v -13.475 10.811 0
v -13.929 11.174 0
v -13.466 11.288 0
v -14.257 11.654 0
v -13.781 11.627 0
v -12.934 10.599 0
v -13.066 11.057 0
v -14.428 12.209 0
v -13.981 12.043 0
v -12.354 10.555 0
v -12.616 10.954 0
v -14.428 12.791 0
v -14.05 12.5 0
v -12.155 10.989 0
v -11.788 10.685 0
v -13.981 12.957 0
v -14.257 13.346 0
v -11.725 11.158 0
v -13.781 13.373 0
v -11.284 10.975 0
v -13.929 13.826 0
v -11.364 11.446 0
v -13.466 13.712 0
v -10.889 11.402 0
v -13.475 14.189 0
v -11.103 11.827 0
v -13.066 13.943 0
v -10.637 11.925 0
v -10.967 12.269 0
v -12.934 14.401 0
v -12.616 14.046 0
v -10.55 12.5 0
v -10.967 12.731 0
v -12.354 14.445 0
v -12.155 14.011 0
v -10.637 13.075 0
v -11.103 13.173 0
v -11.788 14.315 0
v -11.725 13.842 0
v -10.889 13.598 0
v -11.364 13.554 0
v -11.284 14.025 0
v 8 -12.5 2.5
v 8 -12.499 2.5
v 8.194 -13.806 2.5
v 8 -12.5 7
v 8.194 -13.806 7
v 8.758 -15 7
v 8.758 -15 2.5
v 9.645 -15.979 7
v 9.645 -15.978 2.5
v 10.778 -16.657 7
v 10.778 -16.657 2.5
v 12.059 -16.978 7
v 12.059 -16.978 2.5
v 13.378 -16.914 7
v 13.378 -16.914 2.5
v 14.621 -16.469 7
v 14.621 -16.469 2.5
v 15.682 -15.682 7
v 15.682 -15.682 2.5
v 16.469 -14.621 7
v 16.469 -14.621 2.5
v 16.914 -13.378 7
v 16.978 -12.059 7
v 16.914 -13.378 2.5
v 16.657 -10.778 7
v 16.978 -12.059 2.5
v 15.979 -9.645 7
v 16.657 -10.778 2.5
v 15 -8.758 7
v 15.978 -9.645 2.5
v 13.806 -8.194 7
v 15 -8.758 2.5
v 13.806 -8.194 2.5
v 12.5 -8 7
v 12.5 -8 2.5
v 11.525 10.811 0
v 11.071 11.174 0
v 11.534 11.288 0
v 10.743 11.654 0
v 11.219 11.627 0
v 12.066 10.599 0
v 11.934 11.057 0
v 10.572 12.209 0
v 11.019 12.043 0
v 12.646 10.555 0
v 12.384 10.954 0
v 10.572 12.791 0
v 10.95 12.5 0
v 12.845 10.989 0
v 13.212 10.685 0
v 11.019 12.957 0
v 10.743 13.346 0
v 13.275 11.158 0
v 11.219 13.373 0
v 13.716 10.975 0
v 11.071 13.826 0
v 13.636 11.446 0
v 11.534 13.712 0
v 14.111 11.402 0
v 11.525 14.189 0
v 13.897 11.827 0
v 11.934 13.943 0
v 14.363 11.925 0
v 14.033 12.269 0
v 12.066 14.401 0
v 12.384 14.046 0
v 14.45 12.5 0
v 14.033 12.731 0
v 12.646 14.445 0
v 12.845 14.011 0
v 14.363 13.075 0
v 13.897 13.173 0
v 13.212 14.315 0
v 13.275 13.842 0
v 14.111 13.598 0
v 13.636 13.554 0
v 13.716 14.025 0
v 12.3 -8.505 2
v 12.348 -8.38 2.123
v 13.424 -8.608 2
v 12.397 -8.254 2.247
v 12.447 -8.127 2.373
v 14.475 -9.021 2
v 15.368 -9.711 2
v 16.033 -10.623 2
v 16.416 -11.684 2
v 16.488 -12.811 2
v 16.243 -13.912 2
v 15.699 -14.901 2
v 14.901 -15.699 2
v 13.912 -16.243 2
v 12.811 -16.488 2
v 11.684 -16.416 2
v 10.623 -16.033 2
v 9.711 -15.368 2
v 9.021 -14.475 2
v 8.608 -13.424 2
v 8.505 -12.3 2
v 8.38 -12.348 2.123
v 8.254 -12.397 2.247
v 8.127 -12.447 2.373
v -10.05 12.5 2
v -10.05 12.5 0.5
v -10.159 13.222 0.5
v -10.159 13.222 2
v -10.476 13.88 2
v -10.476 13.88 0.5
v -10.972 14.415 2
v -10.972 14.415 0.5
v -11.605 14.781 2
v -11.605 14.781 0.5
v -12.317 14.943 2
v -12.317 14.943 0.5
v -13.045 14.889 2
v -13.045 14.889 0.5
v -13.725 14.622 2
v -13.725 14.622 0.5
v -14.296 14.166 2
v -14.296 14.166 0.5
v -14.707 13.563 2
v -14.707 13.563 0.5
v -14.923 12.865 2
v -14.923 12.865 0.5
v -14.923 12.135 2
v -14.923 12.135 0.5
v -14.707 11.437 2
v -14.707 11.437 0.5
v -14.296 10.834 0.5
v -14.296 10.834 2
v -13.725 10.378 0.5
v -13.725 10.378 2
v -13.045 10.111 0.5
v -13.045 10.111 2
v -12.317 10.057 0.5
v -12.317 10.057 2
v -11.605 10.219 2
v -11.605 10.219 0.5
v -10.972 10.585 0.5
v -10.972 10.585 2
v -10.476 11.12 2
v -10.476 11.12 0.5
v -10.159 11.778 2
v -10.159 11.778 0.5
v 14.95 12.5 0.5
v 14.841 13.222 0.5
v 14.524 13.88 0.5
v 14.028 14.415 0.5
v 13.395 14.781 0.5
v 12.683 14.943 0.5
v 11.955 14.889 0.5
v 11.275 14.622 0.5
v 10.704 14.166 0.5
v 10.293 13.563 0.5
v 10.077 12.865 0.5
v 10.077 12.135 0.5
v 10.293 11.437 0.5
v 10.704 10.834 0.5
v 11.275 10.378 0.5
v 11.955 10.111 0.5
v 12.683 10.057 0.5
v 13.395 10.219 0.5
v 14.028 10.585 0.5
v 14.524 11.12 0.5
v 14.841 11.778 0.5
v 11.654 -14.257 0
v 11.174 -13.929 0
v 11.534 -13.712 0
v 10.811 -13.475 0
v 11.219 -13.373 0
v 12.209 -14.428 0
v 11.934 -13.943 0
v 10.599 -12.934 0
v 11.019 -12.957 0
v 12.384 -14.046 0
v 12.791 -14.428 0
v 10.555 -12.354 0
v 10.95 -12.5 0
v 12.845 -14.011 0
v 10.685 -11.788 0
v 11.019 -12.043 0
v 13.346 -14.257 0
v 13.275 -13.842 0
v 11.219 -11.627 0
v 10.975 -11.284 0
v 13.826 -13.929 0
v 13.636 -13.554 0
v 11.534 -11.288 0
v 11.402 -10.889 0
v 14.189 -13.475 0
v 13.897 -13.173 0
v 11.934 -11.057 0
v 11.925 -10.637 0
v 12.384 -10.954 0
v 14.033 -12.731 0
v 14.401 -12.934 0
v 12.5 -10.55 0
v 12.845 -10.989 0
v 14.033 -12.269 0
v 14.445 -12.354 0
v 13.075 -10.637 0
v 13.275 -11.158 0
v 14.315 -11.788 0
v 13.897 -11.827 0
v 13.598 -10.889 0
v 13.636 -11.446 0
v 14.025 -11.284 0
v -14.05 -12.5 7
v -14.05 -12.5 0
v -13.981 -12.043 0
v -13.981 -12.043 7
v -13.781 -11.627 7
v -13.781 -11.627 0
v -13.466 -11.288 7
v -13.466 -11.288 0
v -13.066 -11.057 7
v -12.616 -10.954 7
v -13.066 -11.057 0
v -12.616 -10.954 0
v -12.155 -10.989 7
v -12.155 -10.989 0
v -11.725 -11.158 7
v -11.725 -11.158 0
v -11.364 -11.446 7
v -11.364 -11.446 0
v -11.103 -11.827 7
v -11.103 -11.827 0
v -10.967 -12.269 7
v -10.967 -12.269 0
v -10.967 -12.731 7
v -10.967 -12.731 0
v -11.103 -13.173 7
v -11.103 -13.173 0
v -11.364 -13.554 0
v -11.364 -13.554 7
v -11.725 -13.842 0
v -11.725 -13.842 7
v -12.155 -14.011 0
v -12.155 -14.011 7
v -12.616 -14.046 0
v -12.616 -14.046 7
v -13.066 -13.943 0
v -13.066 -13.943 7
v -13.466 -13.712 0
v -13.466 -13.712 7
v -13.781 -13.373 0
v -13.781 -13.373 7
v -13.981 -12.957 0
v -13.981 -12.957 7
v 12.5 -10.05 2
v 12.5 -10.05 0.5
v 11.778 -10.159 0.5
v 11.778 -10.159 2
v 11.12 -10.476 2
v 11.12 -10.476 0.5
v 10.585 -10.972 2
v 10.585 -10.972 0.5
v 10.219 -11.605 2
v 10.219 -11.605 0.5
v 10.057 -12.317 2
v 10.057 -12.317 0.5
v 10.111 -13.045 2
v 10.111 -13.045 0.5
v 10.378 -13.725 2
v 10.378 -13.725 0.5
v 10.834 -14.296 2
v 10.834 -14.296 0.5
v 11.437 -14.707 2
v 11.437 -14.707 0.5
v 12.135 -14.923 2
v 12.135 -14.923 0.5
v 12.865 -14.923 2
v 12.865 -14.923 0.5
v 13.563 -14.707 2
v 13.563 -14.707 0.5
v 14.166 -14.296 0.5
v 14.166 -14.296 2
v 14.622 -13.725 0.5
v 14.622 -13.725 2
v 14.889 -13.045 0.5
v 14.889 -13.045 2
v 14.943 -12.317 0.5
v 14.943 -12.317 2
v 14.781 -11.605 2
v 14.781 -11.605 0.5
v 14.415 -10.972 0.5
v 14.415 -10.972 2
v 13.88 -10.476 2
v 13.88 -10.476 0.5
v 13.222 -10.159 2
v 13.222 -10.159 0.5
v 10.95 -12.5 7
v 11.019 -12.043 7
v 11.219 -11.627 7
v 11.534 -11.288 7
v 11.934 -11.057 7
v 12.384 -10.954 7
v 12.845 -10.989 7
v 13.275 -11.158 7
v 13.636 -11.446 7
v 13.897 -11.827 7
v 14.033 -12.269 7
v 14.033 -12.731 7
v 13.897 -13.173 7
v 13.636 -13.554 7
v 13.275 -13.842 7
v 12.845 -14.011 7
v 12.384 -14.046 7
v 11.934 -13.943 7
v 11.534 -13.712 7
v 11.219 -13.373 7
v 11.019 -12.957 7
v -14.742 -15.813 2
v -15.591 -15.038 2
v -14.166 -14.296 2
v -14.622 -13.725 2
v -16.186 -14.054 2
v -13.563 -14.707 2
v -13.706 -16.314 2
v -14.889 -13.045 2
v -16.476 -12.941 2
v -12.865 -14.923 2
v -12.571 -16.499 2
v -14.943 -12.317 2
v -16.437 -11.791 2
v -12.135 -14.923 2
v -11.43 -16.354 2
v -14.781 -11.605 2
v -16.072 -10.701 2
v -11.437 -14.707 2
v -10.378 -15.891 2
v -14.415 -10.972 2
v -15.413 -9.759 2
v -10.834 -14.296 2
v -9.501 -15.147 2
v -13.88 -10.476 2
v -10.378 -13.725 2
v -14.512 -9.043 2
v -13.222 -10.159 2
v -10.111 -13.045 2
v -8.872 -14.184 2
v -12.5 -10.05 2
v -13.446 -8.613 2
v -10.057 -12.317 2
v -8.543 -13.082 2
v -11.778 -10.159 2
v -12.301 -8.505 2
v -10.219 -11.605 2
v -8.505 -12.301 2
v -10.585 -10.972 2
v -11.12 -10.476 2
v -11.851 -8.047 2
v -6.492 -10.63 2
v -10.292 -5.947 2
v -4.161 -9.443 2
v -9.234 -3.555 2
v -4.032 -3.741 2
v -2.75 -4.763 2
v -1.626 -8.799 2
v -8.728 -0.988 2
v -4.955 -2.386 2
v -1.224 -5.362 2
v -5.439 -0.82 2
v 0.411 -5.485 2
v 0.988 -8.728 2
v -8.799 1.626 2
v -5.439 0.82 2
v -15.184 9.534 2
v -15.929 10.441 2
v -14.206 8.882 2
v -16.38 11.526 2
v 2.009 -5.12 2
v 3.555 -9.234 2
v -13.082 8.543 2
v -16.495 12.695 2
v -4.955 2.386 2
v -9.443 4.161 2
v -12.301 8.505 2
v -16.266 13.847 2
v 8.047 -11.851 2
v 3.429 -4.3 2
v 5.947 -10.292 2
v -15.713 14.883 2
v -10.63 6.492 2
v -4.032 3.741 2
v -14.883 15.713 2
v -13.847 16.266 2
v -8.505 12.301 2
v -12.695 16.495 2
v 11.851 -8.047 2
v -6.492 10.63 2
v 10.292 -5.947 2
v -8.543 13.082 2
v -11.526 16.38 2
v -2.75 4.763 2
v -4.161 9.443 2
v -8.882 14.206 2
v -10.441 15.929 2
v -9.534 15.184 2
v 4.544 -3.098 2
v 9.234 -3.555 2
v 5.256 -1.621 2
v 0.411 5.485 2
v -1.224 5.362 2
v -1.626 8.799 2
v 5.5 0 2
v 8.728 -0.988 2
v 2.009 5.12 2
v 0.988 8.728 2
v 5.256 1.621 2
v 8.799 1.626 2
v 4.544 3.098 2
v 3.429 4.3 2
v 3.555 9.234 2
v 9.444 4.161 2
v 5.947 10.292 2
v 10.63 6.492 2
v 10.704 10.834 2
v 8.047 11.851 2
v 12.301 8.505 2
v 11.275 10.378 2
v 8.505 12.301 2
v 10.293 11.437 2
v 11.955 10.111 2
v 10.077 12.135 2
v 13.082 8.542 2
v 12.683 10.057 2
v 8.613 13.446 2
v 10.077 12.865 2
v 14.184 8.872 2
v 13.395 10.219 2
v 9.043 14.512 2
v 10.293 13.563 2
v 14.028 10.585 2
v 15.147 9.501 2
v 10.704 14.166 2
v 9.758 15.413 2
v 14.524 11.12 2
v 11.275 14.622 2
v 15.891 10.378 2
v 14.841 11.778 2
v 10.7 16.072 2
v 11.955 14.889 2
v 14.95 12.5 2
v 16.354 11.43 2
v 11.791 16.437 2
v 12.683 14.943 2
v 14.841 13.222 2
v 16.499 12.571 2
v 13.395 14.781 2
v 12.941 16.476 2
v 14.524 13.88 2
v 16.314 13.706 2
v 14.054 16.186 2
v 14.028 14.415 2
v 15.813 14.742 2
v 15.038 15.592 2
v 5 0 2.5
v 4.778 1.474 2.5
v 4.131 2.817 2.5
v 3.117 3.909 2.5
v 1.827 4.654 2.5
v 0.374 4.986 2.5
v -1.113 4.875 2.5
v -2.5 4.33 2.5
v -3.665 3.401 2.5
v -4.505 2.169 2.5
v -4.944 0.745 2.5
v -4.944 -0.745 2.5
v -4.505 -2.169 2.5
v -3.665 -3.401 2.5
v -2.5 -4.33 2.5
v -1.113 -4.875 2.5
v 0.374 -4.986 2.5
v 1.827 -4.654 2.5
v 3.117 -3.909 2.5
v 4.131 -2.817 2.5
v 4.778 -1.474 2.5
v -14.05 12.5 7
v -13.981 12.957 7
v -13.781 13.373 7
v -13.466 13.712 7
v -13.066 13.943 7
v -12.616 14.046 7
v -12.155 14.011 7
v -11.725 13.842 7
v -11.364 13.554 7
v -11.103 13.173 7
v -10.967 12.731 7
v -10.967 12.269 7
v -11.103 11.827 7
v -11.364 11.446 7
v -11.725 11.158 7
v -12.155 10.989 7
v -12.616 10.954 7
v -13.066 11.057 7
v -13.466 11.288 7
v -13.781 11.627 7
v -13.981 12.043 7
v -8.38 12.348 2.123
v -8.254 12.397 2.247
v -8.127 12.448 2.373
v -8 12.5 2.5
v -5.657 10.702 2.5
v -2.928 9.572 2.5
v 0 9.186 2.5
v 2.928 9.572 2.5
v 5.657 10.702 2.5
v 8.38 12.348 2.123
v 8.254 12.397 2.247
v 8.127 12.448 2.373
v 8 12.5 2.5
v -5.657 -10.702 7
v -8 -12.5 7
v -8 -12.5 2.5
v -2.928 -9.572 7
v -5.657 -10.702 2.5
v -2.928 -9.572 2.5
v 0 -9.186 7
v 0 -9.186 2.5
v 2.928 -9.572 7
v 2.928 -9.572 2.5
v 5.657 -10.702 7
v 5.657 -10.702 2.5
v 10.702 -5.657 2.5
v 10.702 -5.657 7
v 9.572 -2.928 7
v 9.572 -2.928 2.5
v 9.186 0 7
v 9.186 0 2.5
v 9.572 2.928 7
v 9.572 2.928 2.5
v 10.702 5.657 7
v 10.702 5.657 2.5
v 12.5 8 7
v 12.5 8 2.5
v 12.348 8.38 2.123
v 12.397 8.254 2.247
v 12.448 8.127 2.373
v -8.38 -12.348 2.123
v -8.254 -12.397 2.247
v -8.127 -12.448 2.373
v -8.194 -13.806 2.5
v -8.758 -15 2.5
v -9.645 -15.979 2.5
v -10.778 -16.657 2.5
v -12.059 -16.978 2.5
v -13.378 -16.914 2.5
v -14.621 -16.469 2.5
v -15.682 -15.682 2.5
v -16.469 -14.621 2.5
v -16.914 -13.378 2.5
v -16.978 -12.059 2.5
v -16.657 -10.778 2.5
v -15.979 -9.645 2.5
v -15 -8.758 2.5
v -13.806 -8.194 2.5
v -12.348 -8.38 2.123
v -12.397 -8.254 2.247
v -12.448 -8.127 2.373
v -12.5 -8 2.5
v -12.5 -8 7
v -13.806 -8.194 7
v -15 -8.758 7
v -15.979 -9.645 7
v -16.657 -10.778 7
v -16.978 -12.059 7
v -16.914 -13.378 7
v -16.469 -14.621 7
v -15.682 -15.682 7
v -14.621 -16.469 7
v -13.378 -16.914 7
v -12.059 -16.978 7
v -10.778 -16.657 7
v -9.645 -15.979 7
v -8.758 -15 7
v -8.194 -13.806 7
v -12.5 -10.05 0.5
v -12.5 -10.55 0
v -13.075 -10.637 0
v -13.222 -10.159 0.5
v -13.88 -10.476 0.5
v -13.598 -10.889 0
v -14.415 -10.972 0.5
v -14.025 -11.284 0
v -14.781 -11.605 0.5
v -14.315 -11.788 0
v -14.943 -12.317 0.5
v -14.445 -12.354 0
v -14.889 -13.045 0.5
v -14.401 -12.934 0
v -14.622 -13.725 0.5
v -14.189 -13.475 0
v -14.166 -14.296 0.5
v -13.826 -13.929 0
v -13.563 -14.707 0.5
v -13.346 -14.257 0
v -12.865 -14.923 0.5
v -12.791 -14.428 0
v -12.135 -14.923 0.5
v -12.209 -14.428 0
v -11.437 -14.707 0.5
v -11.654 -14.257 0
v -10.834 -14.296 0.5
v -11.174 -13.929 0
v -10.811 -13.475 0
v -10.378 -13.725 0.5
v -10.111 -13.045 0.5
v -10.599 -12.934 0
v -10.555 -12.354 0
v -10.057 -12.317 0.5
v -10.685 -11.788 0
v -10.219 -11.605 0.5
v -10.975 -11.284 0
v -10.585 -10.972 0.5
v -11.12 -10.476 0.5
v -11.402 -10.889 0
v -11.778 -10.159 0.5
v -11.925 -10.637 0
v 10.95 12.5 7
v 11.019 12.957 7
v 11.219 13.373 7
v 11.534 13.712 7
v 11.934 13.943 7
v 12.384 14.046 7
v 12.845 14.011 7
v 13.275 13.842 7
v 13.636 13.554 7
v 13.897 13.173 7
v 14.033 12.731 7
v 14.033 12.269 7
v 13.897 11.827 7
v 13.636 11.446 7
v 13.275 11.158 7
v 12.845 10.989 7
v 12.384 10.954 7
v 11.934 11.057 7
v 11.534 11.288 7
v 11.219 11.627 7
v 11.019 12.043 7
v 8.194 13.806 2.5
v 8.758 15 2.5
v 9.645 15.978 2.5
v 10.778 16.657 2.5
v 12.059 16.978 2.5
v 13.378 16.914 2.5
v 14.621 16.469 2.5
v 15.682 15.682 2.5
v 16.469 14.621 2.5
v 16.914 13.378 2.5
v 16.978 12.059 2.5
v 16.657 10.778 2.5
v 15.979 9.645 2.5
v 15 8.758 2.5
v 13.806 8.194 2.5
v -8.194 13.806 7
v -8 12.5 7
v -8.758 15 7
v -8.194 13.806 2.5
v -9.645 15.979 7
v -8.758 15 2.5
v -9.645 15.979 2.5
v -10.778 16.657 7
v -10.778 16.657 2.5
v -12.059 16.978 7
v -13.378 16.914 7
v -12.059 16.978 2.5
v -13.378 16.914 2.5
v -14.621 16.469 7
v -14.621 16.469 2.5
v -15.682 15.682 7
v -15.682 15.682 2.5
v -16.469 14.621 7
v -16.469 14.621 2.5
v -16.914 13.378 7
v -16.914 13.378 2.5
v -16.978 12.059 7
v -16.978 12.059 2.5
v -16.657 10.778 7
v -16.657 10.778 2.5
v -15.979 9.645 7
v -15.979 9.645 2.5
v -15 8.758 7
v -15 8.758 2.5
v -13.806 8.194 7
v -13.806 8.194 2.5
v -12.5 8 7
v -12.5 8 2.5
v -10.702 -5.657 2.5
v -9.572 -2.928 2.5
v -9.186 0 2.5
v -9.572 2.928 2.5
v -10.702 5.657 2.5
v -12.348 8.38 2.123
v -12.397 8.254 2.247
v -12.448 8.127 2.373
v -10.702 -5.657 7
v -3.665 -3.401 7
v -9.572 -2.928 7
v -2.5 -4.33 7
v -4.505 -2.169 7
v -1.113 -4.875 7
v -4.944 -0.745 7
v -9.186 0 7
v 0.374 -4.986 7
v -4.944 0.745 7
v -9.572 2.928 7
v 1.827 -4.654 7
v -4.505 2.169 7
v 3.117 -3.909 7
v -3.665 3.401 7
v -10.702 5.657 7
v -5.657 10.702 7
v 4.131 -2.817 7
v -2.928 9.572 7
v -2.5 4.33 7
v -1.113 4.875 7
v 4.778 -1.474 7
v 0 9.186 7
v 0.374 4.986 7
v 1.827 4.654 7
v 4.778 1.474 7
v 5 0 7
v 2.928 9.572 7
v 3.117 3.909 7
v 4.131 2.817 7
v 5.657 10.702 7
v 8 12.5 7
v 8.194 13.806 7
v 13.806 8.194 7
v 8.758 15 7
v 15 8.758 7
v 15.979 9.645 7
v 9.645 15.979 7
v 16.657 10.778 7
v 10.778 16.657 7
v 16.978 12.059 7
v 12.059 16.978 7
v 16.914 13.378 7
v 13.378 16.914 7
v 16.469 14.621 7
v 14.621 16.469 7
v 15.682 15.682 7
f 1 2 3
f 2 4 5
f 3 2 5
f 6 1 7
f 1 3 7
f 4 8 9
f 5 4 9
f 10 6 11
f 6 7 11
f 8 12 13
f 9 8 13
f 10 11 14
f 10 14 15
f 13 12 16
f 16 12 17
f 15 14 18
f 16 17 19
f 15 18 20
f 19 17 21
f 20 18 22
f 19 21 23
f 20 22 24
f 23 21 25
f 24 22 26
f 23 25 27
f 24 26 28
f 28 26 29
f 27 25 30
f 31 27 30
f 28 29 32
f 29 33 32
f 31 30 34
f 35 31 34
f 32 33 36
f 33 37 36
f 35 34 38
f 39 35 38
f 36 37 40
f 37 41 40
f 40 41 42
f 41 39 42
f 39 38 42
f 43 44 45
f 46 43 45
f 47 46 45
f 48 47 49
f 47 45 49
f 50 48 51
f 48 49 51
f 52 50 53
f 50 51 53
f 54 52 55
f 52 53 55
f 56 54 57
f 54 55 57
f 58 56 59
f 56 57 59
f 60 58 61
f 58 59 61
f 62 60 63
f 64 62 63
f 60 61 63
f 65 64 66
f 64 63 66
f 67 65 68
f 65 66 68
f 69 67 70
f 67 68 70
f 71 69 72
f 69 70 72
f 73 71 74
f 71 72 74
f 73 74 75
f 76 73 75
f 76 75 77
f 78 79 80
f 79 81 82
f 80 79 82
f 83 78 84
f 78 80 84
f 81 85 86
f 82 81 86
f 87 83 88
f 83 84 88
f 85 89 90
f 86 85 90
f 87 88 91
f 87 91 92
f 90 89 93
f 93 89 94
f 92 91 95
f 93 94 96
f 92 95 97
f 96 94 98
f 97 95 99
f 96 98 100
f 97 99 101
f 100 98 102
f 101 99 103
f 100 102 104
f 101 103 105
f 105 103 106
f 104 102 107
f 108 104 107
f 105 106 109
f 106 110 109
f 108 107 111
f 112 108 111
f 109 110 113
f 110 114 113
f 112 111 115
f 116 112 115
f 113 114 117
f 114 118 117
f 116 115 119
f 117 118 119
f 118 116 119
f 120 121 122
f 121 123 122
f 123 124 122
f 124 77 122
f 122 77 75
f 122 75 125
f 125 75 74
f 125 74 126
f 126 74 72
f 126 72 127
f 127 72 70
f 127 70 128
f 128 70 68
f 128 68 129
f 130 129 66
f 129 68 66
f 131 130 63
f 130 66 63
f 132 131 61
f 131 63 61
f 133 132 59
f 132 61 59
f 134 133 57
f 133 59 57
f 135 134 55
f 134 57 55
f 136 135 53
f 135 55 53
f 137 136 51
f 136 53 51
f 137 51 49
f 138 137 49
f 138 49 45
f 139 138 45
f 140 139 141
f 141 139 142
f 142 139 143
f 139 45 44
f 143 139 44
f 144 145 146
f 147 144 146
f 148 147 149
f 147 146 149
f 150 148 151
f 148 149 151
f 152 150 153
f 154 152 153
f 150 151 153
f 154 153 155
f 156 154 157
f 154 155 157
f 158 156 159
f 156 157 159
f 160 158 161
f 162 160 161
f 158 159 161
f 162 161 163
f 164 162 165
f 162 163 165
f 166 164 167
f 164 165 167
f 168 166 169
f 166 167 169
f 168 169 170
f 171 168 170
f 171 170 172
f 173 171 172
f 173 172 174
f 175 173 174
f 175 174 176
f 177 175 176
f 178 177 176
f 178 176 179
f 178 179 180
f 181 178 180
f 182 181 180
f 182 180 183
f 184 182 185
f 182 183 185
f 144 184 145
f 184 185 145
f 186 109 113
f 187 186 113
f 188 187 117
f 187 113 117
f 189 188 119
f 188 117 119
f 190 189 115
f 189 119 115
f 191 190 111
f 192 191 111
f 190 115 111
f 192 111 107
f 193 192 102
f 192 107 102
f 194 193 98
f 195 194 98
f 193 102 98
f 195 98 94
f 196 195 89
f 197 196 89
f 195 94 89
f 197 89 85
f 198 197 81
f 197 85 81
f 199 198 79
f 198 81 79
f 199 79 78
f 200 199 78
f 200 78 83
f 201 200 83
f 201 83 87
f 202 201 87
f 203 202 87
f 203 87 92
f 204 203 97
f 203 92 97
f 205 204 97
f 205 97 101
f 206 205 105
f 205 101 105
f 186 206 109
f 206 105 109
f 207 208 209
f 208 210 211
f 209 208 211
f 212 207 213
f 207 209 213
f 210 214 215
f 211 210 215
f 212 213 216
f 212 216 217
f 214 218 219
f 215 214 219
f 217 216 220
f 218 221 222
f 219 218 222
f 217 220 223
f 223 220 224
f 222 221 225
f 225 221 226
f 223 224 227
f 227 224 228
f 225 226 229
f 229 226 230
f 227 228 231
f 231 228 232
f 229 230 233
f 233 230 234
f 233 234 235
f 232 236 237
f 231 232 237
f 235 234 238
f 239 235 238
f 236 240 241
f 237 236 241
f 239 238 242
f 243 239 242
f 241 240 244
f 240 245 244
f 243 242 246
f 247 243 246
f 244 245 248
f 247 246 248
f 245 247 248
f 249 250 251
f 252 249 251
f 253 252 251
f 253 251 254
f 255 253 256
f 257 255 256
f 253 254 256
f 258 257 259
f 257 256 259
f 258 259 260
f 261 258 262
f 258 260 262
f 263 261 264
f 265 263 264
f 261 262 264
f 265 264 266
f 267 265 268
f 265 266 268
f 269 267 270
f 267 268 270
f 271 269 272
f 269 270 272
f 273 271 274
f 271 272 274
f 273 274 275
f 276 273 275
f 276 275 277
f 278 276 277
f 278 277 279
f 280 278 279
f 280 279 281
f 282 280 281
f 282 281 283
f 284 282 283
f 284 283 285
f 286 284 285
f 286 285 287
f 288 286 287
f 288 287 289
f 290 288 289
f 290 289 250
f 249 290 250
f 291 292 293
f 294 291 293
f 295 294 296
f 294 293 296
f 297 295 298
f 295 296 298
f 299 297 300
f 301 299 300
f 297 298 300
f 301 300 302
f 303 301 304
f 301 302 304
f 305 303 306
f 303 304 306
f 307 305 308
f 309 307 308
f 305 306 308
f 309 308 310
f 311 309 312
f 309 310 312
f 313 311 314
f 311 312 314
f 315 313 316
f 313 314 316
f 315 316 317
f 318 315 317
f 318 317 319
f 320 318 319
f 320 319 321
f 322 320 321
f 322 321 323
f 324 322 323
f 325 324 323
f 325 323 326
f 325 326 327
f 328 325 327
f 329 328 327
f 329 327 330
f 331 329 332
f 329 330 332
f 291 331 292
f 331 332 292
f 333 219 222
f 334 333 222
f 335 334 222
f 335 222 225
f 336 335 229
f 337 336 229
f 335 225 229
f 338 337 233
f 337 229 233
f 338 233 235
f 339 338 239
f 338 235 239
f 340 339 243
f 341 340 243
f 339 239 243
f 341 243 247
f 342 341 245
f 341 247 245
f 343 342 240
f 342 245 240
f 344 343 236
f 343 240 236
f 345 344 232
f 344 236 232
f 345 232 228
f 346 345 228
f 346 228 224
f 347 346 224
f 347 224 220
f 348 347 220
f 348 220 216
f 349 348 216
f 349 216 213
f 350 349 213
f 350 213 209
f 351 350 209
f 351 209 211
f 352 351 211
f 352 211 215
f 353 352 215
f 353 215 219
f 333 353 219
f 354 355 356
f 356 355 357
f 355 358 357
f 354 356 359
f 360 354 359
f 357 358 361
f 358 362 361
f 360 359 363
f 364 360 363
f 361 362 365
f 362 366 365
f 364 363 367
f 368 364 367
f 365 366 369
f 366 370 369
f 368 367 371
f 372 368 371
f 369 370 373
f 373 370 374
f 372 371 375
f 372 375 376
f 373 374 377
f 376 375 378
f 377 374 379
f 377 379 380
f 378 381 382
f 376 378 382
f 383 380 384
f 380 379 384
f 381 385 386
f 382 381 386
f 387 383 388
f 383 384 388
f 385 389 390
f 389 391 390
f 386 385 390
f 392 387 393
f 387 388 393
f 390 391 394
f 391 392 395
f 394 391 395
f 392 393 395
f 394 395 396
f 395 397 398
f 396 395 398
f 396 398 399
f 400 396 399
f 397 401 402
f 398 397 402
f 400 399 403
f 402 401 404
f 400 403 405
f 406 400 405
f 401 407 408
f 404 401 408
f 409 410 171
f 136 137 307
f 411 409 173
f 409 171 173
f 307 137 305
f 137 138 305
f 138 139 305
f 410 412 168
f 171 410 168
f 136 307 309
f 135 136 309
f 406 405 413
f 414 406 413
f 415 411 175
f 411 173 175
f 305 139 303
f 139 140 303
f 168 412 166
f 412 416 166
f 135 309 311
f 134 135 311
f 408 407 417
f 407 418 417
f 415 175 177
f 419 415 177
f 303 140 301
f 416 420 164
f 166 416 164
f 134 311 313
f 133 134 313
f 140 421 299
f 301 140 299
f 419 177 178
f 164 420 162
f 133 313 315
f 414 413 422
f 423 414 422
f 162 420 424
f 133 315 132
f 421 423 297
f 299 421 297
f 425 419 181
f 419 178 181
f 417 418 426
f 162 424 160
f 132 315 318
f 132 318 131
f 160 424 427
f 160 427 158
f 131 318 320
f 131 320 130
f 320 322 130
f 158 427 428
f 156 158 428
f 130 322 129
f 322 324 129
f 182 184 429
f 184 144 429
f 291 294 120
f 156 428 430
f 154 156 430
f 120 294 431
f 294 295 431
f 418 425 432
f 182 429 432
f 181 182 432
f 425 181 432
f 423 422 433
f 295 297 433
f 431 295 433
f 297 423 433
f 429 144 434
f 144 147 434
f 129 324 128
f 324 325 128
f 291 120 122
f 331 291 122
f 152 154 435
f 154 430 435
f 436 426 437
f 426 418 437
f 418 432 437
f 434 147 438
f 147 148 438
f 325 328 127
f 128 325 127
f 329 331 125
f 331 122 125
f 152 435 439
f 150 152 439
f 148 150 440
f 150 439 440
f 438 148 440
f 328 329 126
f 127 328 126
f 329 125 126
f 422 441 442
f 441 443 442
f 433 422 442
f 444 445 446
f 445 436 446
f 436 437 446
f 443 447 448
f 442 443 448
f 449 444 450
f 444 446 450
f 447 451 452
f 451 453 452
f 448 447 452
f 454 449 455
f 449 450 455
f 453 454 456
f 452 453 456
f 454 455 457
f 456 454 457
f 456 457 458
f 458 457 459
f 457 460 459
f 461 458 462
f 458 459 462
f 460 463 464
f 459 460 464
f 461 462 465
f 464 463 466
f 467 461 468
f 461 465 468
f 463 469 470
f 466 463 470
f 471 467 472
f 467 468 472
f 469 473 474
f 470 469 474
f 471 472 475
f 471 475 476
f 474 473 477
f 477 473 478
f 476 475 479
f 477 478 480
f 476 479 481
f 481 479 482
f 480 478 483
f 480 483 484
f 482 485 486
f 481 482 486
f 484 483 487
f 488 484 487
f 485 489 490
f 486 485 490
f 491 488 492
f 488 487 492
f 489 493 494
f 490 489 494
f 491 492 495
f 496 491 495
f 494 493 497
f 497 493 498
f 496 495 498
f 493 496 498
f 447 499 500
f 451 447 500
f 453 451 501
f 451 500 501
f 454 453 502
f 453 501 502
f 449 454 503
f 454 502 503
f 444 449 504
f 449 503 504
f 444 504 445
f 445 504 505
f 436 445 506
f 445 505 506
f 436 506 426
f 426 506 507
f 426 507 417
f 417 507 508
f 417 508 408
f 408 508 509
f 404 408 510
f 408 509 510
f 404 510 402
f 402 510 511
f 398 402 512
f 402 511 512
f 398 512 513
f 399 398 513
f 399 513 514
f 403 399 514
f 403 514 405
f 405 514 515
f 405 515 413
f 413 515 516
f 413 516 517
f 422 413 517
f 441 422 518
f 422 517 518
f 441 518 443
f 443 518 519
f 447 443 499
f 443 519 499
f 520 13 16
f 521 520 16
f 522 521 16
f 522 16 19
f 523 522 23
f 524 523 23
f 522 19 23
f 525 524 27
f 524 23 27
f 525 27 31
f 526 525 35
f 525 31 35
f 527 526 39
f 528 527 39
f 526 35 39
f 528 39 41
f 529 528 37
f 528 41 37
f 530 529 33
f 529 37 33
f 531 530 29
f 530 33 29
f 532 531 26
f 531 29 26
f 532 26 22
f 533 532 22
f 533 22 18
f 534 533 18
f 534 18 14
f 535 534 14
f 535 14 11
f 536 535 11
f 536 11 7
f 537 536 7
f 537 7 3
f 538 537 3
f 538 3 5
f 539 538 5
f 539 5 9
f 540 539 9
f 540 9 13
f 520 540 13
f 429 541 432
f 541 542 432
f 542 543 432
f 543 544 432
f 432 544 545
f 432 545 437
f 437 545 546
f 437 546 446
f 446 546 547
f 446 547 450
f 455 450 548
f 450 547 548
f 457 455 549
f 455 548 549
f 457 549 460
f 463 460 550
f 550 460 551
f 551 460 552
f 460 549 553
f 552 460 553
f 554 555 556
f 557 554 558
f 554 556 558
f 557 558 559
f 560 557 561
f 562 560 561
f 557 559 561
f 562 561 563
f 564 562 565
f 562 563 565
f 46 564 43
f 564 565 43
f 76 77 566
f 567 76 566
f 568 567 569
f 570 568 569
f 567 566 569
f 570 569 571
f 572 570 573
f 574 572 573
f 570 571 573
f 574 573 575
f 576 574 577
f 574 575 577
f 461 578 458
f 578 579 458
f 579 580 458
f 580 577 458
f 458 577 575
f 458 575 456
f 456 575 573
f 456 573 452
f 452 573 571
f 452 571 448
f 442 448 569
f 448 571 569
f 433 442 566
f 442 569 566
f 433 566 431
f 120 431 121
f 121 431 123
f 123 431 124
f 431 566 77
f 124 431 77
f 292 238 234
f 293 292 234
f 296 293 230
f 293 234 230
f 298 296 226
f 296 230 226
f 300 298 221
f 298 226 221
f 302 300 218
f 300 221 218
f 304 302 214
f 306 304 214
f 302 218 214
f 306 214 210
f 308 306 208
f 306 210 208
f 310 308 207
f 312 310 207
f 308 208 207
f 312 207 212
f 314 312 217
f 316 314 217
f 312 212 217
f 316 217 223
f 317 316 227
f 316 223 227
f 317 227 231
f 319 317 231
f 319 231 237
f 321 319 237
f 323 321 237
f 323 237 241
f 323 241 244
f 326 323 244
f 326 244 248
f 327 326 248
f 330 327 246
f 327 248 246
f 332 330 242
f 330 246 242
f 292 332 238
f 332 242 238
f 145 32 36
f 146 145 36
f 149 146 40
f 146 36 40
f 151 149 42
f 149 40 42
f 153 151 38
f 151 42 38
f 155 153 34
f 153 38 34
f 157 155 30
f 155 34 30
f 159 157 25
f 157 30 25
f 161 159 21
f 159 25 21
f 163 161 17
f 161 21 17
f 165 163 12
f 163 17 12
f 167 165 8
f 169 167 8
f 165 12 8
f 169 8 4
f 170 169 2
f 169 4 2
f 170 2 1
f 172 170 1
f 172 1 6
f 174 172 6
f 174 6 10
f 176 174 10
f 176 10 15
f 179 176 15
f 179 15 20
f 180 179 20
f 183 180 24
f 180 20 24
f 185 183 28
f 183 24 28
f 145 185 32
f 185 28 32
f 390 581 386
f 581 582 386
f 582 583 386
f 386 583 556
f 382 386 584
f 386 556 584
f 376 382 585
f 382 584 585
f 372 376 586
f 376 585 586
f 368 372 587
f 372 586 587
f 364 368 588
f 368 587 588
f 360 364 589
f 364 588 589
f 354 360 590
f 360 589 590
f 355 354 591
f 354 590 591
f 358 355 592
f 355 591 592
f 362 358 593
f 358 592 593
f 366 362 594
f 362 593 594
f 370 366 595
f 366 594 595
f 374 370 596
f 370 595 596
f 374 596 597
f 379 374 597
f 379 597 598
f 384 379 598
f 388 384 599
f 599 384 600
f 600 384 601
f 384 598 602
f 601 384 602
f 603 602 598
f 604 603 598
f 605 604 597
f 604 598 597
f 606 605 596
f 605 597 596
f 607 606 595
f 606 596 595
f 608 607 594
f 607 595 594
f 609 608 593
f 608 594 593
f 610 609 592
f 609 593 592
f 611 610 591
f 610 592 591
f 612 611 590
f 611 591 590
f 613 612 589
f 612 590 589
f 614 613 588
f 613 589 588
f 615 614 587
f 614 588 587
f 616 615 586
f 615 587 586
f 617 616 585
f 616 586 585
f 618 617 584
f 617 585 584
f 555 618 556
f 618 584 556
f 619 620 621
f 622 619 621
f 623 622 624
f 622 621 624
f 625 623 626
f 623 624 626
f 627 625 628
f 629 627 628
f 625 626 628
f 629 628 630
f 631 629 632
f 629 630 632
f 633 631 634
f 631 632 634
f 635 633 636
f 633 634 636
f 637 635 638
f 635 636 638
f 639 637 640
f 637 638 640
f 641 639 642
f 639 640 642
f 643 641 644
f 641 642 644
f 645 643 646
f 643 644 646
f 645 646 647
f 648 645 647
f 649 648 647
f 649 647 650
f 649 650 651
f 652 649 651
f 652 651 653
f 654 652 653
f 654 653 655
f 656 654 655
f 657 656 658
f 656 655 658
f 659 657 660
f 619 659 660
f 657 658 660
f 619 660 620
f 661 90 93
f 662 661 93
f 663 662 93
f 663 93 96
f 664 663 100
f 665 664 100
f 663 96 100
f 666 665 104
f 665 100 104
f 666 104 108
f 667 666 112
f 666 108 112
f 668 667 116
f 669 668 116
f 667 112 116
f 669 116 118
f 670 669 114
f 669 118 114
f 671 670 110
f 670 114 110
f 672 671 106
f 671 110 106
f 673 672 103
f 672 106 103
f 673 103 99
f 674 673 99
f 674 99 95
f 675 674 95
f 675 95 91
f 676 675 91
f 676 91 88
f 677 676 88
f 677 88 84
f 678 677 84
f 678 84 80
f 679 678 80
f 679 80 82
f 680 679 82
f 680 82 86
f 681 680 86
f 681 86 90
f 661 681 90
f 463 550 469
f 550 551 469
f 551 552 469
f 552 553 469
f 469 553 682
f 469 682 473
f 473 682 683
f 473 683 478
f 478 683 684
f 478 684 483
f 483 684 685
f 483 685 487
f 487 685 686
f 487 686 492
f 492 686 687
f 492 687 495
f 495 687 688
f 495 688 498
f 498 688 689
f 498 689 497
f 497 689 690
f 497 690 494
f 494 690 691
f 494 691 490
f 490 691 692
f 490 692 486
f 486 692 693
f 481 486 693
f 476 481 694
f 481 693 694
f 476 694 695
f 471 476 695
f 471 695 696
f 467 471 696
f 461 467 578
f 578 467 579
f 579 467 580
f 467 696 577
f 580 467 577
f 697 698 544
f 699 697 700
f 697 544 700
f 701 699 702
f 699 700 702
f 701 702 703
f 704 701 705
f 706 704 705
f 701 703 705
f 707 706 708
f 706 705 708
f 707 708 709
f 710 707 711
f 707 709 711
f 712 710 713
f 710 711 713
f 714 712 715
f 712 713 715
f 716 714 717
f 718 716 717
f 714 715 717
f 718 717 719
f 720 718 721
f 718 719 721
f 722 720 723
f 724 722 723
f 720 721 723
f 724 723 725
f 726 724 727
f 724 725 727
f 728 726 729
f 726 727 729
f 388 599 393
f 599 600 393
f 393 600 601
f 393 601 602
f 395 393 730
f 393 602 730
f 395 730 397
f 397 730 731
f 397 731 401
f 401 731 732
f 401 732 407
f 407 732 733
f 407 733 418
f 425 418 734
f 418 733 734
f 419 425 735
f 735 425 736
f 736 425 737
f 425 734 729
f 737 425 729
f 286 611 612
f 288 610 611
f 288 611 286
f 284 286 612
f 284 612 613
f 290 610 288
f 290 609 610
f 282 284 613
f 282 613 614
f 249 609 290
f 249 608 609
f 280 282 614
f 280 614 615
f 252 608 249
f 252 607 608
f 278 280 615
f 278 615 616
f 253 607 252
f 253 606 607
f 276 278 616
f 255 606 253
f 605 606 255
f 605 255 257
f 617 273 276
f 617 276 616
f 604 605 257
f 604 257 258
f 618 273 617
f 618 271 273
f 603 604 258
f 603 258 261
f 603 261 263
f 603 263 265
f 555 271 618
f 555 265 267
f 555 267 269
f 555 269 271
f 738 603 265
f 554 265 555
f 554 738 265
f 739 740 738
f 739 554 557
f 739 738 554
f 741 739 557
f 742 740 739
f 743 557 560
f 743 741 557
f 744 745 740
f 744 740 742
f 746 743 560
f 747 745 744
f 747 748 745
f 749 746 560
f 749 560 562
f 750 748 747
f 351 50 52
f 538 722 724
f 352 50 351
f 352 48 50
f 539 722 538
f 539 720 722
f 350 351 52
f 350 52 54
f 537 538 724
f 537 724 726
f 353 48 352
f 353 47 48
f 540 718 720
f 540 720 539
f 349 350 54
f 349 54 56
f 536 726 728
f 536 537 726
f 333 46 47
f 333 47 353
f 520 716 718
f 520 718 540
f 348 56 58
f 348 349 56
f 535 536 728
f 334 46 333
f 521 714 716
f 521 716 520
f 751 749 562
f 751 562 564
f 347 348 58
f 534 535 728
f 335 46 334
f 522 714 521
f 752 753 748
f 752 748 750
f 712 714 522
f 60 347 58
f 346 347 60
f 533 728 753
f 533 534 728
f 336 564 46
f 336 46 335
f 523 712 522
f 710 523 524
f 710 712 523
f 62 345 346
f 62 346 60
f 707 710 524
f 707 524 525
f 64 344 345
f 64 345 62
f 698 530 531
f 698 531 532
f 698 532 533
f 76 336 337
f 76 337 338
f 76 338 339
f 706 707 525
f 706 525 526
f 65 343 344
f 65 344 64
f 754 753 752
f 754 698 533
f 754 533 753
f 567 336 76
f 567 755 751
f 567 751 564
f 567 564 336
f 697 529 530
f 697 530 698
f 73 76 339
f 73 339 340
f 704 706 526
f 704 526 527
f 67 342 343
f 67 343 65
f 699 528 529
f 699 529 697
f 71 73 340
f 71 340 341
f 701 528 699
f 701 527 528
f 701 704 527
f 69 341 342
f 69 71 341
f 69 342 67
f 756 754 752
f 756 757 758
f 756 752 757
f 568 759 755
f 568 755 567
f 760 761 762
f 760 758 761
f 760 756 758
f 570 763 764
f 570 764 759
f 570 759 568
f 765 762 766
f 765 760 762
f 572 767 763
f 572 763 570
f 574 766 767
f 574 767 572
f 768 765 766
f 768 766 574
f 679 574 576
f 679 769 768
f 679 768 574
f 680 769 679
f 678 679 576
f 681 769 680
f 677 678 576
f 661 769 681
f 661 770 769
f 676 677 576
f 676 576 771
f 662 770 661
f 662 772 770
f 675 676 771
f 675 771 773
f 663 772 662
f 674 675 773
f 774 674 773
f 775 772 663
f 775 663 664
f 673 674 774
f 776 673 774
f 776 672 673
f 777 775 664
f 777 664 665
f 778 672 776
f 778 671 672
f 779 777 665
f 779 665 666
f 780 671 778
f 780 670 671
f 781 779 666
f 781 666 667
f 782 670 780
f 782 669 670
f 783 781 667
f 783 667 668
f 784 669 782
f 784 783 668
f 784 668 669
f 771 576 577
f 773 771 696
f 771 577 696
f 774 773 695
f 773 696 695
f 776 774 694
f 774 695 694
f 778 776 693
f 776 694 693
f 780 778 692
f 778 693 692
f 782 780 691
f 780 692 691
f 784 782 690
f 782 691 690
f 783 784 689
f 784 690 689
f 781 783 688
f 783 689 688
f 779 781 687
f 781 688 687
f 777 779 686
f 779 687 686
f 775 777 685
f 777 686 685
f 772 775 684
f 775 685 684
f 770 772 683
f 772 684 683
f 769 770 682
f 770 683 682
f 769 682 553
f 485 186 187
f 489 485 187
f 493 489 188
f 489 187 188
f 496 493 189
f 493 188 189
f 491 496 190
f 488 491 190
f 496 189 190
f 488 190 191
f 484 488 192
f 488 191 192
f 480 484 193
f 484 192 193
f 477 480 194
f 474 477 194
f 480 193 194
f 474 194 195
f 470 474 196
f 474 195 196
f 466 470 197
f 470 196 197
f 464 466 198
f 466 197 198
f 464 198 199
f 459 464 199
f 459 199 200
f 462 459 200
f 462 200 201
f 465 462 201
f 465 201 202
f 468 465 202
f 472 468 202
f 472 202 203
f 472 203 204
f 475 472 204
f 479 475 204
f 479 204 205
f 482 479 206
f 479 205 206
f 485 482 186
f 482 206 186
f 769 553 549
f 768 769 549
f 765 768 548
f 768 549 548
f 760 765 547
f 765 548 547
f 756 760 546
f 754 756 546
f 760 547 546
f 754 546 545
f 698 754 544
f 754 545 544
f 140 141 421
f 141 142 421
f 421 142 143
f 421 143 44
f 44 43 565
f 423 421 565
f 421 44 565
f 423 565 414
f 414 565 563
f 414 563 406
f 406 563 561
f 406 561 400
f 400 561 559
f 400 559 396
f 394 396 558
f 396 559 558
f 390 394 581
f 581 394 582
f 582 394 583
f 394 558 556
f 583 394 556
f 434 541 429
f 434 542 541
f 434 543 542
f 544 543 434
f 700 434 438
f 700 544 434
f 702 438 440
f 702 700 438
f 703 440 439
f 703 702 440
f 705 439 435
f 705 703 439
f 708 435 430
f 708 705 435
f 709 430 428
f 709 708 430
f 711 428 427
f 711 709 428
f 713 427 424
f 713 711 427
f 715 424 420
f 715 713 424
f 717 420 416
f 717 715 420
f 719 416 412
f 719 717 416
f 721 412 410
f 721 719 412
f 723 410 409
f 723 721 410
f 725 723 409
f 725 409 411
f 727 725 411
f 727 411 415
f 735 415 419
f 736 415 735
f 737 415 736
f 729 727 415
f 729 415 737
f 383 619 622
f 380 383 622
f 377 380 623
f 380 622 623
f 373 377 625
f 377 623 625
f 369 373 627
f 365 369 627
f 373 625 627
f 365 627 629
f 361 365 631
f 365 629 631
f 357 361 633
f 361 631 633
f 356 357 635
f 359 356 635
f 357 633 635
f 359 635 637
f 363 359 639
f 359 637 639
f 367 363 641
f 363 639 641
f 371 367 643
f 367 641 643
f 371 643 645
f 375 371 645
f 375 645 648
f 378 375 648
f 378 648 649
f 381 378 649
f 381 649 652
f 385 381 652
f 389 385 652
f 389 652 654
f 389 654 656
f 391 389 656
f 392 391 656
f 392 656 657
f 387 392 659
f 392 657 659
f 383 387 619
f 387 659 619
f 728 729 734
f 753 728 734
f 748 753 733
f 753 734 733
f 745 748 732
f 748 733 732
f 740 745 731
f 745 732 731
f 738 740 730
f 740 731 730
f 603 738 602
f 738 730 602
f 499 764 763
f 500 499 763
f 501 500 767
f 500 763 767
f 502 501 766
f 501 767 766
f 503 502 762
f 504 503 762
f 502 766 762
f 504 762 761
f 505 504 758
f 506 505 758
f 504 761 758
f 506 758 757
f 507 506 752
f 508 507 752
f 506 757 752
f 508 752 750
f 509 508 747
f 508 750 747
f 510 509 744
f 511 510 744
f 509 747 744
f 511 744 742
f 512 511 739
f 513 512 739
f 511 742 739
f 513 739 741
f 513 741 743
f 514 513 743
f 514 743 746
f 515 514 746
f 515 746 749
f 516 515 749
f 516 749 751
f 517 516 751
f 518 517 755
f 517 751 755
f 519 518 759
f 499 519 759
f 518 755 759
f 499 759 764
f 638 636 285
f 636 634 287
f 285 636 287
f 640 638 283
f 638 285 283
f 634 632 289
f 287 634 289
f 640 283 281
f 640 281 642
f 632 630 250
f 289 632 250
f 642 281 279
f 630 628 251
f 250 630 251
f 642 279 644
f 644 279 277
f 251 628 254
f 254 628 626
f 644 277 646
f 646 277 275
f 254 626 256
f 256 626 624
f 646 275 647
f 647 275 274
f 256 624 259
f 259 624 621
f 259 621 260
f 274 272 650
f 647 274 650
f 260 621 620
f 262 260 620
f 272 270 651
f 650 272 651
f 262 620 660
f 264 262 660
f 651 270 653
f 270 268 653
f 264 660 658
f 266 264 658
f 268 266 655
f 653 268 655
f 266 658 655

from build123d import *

# Parameters (mm, degrees)
CROQUIS1_R              = 2.4500000000000015
SALIENTE_EXTRUIR1_DEPTH = 2
SALIENTE_EXTRUIR2_DEPTH = 5
CROQUIS3_R              = 1.5499999999999992
CORTAR_EXTRUIR1_DEPTH   = 26.03996805109803
CROQUIS4_R              = 5
CORTAR_EXTRUIR2_DEPTH   = 5
CHAFL_N1_SIZE           = 0.5
CHAFL_N2_SIZE           = 0.5


with BuildPart() as part:
    # Croquis1 → Saliente-Extruir1 (new body)
    with BuildSketch(Plane.XY):
        with BuildLine():
            ThreePointArc((-10.049999999999738, -12.5), (-10.76758838609276, -10.767588386092894), (-12.499999999999918, -10.049999999999999))
            Line((-12.499999999999996, -10.049999999999997), (-12.499999999999996, -12.5))
            Line((-12.499999999999996, -12.5), (-10.049999999999738, -12.5))
        make_face()
        with BuildLine():
            Line((-12.499999999999996, -12.5), (-12.499999999999996, -10.049999999999997))
            ThreePointArc((-12.499999999999918, -10.049999999999999), (-14.232411613906718, -14.232411613907106), (-10.049999999999738, -12.5))
            Line((-10.049999999999738, -12.5), (-12.499999999999996, -12.5))
        make_face()
        with BuildLine():
            ThreePointArc((14.950000000000262, -12.5), (14.23241161390724, -10.767588386092894), (12.500000000000082, -10.049999999999999))
            Line((12.500000000000004, -10.05), (12.500000000000004, -12.499999999999996))
            Line((12.500000000000004, -12.499999999999996), (10.05000000000026, -12.499999999999996))
            ThreePointArc((10.05000000000026, -12.5), (12.500000000000261, -14.950000000000001), (14.950000000000262, -12.5))
        make_face()
        with BuildLine():
            Line((12.500000000000004, -12.499999999999996), (12.500000000000004, -10.05))
            ThreePointArc((12.500000000000082, -10.049999999999999), (10.767588386093156, -10.76758838609302), (10.05000000000026, -12.5))
            Line((10.05000000000026, -12.499999999999996), (12.500000000000004, -12.499999999999996))
        make_face()
        with BuildLine():
            ThreePointArc((-12.499999999999922, 10.049999999999999), (-10.76758838609293, 10.767588386092985), (-10.049999999999999, 12.5))
            Line((-10.049999999999997, 12.5), (-12.5, 12.5))
            Line((-12.5, 12.5), (-12.5, 10.049999999999999))
        make_face()
        with BuildLine():
            Line((-12.5, 12.5), (-10.049999999999997, 12.5))
            ThreePointArc((-10.049999999999999, 12.5), (-14.23241161390707, 14.232411613907015), (-12.499999999999922, 10.049999999999999))
            Line((-12.5, 10.049999999999999), (-12.5, 12.5))
        make_face()
        with Locations((12.5, 12.5)):
            Circle(CROQUIS1_R)
    extrude(amount=SALIENTE_EXTRUIR1_DEPTH)

    # Croquis2 → Saliente-Extruir2 (add)
    with BuildSketch(Plane.XY.offset(2)):
        with BuildLine():
            ThreePointArc((-7.999999999999958, 12.499999999999764), (-15.68198051533941, 15.681980515339577), (-12.5, 8))
            ThreePointArc((-12.5, 8), (-9.186291501015104, 5.367e-14), (-12.499999999999739, -8))
            ThreePointArc((-12.499999999999739, -8), (-15.681980515339163, -15.681980515339504), (-7.999999999999414, -12.499999999999883))
            ThreePointArc((-7.999999999999414, -12.499999999999883), (3.2112e-13, -9.18629150101557), (8.000000000000586, -12.499999999999618))
            ThreePointArc((8.000000000000586, -12.499999999999618), (15.681980515339447, -15.681980515339283), (12.500000000000016, -8.000000000000036))
            ThreePointArc((12.500000000000016, -8.000000000000036), (9.186291501015239, -2.647e-14), (12.50000000000002, 7.999999999999989))
            ThreePointArc((12.50000000000002, 7.999999999999989), (15.681980515339454, 15.68198051533949), (8.000000000000043, 12.49999999999997))
            ThreePointArc((8.000000000000043, 12.49999999999997), (8.613e-14, 9.1862915010151), (-7.999999999999958, 12.499999999999764))
        make_face()
    extrude(amount=SALIENTE_EXTRUIR2_DEPTH)

    # Croquis3 → Cortar-Extruir1 (cut, through all)
    with BuildSketch(Plane(origin=(0, 0, 0), x_dir=(-1, 0, 0), z_dir=(0, 0, -1))):
        with Locations((-12.500000000000261, -12.5)):
            Circle(CROQUIS3_R)
        with Locations((12.49999999999974, -12.5)):
            Circle(CROQUIS3_R)
        with Locations((12.499999999999654, 12.5)):
            Circle(CROQUIS3_R)
        with Locations((-12.500000000000348, 12.5)):
            Circle(CROQUIS3_R)
    extrude(amount=-CORTAR_EXTRUIR1_DEPTH, mode=Mode.SUBTRACT)

    # Croquis4 → Cortar-Extruir2 (cut)
    with BuildSketch(Plane.XY.offset(7)):
        Circle(CROQUIS4_R)
    extrude(amount=-CORTAR_EXTRUIR2_DEPTH, mode=Mode.SUBTRACT)

    # Chaflán1
    chafl_n1_edges = [part.edges().sort_by_distance(p)[0] for p in [
        (10.050000000000264, -12.5, 0),
        (-14.949999999999736, -12.5, 0),
        (-12.500000000000078, 14.950000000000001, 0),
        (10.049999999999999, 12.5, 0),
    ]]
    chamfer(chafl_n1_edges, length=CHAFL_N1_SIZE)

    # Chaflán2
    chafl_n2_edges = [part.edges().sort_by_distance(p)[0] for p in [
        (-15.681980515339374, 15.68198051533961, 2),
    ]]
    chamfer(chafl_n2_edges, length=CHAFL_N2_SIZE)
    chafl_n2_2_edges = [part.edges().sort_by_distance(p)[0] for p in [
        (8.438e-14, 9.186291501015104, 2),
    ]]
    chamfer(chafl_n2_2_edges, length=CHAFL_N2_SIZE)
    chafl_n2_3_edges = [part.edges().sort_by_distance(p)[0] for p in [
        (-9.186291501015104, 5.44e-14, 2),
    ]]
    chamfer(chafl_n2_3_edges, length=CHAFL_N2_SIZE)
    chafl_n2_4_edges = [part.edges().sort_by_distance(p)[0] for p in [
        (15.681980515339504, 15.681980515339442, 2),
    ]]
    chamfer(chafl_n2_4_edges, length=CHAFL_N2_SIZE - 0.0001)  # a hair under: the kernel refuses the full size
    chafl_n2_5_edges = [part.edges().sort_by_distance(p)[0] for p in [
        (-15.681980515338884, -15.68198051533978, 2),
    ]]
    chamfer(chafl_n2_5_edges, length=CHAFL_N2_SIZE)
    chafl_n2_6_edges = [part.edges().sort_by_distance(p)[0] for p in [
        (9.186291501015239, -2.132e-14, 2),
    ]]
    chamfer(chafl_n2_6_edges, length=CHAFL_N2_SIZE - 0.0001)  # a hair under: the kernel refuses the full size
    chafl_n2_7_edges = [part.edges().sort_by_distance(p)[0] for p in [
        (5.318e-13, -9.18629150101557, 2),
    ]]
    chamfer(chafl_n2_7_edges, length=CHAFL_N2_SIZE)
    chafl_n2_8_edges = [part.edges().sort_by_distance(p)[0] for p in [
        (15.681980515339694, -15.681980515339037, 2),
    ]]
    chamfer(chafl_n2_8_edges, length=CHAFL_N2_SIZE - 0.0004)  # a hair under: the kernel refuses the full size
    chafl_n2_9_edges = [part.edges().sort_by_distance(p)[0] for p in [
        (-5, 6.1e-16, 2),
    ]]
    chamfer(chafl_n2_9_edges, length=CHAFL_N2_SIZE)


solid = part.part
